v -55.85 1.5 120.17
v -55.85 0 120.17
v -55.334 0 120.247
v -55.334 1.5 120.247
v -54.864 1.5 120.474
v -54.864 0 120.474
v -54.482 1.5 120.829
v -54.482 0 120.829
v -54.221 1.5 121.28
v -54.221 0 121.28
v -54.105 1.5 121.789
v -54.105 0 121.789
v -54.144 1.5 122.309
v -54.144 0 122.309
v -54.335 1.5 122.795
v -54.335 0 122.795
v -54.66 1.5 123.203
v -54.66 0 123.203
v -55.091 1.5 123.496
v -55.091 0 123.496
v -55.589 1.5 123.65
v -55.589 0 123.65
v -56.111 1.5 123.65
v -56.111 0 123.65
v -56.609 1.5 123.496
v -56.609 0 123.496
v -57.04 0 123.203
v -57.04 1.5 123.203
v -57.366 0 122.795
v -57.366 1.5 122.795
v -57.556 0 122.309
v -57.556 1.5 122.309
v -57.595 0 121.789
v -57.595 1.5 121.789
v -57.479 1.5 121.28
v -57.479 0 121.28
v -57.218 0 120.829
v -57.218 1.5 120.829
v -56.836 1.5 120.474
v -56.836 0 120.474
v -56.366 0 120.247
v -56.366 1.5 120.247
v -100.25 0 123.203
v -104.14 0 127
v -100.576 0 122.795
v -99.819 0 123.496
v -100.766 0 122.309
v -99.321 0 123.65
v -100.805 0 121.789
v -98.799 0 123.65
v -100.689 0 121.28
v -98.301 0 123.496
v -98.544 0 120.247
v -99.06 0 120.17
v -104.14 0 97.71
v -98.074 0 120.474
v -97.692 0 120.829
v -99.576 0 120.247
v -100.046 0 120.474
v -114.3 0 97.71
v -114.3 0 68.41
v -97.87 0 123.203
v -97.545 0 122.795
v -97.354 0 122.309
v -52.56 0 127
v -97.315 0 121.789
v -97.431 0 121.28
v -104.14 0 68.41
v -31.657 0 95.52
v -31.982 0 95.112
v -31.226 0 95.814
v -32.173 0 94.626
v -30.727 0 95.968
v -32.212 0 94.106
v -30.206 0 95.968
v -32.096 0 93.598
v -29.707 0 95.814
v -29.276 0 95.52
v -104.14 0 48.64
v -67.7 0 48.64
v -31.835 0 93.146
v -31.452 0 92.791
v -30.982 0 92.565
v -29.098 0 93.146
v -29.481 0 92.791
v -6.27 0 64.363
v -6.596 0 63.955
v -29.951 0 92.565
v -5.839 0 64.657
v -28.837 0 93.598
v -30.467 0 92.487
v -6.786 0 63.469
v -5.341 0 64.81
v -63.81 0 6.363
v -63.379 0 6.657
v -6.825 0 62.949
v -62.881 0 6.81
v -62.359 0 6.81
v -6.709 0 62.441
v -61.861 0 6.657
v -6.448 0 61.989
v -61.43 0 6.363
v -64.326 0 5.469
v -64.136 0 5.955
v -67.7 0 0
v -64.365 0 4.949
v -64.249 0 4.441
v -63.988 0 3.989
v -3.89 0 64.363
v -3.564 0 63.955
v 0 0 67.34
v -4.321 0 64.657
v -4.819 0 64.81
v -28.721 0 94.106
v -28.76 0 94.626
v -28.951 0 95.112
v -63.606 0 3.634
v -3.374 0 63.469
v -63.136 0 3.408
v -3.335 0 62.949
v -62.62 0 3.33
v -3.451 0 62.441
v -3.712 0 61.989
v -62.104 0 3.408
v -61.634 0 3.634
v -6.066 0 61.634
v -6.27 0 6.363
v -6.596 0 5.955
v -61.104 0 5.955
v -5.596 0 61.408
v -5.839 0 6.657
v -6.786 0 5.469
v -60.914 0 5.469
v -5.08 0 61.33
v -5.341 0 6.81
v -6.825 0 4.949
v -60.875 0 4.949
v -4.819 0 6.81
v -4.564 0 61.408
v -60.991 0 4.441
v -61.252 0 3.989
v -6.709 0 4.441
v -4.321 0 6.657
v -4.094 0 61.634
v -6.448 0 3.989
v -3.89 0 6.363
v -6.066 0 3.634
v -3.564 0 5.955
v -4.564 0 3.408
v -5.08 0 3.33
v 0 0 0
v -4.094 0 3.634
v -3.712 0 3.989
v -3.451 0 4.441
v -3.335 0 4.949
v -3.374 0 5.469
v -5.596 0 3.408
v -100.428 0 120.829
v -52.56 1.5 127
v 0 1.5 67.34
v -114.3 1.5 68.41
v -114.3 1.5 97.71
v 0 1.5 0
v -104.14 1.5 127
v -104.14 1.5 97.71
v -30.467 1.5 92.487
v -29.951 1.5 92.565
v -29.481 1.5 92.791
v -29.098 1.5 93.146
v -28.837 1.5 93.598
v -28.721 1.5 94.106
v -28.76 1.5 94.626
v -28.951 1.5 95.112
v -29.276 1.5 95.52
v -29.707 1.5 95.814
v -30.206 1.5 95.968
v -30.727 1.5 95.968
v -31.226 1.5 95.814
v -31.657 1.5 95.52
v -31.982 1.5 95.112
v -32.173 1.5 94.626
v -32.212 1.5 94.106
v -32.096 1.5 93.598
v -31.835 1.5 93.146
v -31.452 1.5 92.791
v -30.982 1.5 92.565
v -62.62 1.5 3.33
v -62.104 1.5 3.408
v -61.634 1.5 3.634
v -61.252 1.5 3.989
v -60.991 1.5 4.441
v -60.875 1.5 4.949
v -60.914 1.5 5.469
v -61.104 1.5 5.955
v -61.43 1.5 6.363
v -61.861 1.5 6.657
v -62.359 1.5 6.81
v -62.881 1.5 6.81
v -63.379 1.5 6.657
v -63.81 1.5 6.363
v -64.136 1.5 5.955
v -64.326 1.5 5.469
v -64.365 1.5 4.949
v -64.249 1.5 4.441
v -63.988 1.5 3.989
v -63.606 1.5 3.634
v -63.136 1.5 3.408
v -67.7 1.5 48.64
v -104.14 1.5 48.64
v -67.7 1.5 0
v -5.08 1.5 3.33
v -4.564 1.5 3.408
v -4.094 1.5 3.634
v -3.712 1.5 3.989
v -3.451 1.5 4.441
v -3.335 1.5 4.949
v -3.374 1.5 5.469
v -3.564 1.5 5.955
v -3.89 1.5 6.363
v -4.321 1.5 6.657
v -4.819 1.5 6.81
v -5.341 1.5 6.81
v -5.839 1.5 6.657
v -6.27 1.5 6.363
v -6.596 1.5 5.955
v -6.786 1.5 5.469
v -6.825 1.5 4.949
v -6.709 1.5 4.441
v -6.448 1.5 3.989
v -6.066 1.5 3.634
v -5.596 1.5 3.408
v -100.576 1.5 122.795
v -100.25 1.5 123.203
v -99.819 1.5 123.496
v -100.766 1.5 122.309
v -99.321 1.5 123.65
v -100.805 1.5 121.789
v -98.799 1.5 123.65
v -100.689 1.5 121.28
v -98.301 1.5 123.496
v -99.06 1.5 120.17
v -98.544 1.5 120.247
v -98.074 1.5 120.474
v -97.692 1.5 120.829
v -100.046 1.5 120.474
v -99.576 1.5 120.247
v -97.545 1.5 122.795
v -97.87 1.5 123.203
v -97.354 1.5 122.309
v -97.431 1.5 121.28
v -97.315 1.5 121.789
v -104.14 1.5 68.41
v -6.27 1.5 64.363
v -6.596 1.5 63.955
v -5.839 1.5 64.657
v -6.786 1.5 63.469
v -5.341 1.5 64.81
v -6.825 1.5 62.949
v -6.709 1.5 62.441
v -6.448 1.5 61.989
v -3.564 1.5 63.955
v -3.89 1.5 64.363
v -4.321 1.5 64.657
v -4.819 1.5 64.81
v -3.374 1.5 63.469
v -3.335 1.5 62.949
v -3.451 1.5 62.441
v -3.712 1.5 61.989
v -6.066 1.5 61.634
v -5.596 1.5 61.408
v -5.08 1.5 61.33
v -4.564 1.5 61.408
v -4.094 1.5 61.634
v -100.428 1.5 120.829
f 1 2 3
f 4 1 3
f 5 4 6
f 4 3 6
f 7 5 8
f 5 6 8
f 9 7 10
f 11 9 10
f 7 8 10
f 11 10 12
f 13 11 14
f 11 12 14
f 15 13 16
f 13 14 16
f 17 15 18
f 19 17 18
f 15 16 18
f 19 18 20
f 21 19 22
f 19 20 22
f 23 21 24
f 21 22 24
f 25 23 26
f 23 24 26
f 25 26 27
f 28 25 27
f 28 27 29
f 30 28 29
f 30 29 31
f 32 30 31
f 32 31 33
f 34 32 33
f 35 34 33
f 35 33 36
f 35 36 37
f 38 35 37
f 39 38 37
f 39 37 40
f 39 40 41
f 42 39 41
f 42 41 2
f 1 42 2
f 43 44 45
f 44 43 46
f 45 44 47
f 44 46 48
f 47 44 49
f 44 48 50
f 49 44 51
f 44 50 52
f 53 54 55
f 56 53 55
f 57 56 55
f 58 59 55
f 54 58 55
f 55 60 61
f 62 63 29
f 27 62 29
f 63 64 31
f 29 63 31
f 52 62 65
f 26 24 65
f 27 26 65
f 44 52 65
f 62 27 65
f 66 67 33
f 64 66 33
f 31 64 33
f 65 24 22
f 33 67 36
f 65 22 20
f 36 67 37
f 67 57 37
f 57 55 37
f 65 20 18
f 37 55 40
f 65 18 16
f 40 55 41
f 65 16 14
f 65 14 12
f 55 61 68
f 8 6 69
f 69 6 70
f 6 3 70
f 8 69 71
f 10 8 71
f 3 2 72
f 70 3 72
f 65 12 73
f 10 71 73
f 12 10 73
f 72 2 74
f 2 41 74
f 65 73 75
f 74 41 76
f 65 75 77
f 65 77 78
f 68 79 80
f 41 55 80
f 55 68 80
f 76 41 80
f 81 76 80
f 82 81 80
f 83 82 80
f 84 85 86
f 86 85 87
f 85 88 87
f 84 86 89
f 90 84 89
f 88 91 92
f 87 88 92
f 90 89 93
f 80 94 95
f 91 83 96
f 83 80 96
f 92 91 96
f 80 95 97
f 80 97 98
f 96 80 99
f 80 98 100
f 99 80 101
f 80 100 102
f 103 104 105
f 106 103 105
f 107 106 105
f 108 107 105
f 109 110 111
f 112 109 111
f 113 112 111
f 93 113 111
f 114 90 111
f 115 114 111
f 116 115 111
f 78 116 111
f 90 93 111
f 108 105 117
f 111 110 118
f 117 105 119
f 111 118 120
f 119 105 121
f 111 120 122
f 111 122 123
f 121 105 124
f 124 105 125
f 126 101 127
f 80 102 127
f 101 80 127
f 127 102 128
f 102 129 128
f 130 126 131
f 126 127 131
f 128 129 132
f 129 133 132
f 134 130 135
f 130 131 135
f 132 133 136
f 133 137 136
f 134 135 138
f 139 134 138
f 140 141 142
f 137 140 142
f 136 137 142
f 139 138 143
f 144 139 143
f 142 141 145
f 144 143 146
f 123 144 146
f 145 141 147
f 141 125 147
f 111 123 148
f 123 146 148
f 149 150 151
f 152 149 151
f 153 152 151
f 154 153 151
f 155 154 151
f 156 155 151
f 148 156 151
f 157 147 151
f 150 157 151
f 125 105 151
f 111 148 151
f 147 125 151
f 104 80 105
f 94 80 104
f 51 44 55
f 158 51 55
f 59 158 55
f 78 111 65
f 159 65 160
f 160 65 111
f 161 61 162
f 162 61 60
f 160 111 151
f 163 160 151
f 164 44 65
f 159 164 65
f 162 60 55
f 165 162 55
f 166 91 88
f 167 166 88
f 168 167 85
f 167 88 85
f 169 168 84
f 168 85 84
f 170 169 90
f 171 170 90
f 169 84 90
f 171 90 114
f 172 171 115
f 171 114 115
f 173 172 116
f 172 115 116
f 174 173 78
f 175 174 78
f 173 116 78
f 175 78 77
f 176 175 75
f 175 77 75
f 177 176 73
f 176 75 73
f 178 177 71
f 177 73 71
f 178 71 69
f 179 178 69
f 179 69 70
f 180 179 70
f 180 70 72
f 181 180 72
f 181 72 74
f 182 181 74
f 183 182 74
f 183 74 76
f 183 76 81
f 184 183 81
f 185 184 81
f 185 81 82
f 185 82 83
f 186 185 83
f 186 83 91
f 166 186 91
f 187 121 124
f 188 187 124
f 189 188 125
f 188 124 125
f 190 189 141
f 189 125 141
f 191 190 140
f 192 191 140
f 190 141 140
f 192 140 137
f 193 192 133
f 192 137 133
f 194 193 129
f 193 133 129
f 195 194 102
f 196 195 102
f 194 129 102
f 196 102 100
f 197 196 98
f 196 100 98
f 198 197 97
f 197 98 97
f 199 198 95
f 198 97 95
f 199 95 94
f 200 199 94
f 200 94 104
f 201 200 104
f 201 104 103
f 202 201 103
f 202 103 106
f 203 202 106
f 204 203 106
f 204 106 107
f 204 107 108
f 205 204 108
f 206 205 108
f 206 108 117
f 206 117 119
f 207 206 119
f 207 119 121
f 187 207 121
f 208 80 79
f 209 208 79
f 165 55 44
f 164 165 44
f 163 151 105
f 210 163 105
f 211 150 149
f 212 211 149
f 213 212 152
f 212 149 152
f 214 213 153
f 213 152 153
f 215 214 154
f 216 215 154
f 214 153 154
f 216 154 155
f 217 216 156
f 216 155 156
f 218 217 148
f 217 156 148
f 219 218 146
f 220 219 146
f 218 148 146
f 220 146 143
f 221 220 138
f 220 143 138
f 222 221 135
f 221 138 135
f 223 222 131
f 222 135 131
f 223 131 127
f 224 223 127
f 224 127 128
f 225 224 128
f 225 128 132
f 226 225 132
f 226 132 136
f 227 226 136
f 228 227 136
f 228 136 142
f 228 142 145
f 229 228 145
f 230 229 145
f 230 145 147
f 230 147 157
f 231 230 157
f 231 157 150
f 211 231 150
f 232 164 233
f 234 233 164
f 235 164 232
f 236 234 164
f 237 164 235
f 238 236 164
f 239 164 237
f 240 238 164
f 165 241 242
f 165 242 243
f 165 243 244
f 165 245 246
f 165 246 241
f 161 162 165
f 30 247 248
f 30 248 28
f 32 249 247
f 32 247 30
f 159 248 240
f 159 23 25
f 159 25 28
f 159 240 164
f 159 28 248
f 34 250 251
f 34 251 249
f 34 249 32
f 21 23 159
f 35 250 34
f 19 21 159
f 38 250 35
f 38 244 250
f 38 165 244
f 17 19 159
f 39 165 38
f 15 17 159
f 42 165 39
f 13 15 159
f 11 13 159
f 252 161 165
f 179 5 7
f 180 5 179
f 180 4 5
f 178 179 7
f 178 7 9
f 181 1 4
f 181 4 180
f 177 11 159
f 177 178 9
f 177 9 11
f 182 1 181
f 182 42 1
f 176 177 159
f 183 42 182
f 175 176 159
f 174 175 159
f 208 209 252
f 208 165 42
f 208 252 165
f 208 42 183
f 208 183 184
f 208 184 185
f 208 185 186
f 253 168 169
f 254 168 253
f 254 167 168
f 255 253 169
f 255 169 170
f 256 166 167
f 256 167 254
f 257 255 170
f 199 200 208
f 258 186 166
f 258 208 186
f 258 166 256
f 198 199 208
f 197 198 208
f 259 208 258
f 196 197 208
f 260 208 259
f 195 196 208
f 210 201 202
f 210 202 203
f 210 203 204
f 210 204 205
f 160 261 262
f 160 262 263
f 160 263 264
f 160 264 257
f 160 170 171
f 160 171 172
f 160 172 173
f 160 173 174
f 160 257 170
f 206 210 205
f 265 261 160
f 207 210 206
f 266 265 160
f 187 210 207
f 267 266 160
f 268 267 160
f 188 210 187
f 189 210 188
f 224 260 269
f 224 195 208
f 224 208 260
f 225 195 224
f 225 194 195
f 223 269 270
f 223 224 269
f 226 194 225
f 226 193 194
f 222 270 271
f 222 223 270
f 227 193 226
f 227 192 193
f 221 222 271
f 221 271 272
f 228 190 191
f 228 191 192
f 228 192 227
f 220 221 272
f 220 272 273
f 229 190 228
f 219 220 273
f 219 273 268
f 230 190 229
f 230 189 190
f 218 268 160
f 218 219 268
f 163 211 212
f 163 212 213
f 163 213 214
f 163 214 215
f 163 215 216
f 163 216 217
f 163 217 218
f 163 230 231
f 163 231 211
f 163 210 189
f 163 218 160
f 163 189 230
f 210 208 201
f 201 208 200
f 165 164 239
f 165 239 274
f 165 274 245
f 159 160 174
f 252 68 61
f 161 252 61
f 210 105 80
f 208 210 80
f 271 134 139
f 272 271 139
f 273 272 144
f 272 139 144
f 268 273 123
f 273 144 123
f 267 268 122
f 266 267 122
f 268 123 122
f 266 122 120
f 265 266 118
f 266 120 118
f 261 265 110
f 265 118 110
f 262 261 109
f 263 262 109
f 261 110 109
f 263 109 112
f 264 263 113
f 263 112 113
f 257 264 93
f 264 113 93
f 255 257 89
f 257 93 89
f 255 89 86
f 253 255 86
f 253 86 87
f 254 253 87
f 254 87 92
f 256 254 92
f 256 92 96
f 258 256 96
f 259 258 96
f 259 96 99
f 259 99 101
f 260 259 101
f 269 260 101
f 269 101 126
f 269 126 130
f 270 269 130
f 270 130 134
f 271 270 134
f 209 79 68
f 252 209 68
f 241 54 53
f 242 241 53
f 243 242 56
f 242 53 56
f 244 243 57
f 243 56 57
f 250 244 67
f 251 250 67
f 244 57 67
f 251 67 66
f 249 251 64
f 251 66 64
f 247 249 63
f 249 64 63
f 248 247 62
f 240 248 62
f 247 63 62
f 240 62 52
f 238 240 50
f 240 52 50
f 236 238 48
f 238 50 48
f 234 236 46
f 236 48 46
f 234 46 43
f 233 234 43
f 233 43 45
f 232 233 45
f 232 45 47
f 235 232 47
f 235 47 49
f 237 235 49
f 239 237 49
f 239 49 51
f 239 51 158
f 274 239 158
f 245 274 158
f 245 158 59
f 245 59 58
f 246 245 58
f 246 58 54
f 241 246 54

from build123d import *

# Parameters (mm, degrees)
BOSS_EXTRUDE1_DEPTH   = 1.5
F_4_0MM_DOWEL_HOLE1_D = 3.5


with BuildPart() as part:
    # Sketch1 → Boss-Extrude1 (new body)
    with BuildSketch(Plane(origin=(0, 0, 0), x_dir=(1, 0, 0), z_dir=(0, 1, 0))):
        Polygon((0, 0), (-67.7, 0), (-67.7, -48.64), (-104.14, -48.64), (-104.14, -68.409681711), (-114.3, -68.409681711), (-114.300084457, -97.709681711), (-104.140084457, -97.709681711), (-104.140084457, -126.999681711), (-52.560084457, -126.999681711), (0, -67.34), align=None)
    extrude(amount=BOSS_EXTRUDE1_DEPTH)

    # Ø4.0mm Dowel Hole1 (through all)
    with Locations(Plane(origin=(-99.060084457, 1.5, 121.919681711), x_dir=(0, 0, 1), z_dir=(0, 1, 0))):
        with Locations((0, 0), (0, 43.21), (-58.839681711, 93.980084457), (-27.682634748, 68.593581655), (-116.839681711, 93.980084457), (-116.839681711, 36.440084457)):
            Hole(F_4_0MM_DOWEL_HOLE1_D / 2)


solid = part.part
